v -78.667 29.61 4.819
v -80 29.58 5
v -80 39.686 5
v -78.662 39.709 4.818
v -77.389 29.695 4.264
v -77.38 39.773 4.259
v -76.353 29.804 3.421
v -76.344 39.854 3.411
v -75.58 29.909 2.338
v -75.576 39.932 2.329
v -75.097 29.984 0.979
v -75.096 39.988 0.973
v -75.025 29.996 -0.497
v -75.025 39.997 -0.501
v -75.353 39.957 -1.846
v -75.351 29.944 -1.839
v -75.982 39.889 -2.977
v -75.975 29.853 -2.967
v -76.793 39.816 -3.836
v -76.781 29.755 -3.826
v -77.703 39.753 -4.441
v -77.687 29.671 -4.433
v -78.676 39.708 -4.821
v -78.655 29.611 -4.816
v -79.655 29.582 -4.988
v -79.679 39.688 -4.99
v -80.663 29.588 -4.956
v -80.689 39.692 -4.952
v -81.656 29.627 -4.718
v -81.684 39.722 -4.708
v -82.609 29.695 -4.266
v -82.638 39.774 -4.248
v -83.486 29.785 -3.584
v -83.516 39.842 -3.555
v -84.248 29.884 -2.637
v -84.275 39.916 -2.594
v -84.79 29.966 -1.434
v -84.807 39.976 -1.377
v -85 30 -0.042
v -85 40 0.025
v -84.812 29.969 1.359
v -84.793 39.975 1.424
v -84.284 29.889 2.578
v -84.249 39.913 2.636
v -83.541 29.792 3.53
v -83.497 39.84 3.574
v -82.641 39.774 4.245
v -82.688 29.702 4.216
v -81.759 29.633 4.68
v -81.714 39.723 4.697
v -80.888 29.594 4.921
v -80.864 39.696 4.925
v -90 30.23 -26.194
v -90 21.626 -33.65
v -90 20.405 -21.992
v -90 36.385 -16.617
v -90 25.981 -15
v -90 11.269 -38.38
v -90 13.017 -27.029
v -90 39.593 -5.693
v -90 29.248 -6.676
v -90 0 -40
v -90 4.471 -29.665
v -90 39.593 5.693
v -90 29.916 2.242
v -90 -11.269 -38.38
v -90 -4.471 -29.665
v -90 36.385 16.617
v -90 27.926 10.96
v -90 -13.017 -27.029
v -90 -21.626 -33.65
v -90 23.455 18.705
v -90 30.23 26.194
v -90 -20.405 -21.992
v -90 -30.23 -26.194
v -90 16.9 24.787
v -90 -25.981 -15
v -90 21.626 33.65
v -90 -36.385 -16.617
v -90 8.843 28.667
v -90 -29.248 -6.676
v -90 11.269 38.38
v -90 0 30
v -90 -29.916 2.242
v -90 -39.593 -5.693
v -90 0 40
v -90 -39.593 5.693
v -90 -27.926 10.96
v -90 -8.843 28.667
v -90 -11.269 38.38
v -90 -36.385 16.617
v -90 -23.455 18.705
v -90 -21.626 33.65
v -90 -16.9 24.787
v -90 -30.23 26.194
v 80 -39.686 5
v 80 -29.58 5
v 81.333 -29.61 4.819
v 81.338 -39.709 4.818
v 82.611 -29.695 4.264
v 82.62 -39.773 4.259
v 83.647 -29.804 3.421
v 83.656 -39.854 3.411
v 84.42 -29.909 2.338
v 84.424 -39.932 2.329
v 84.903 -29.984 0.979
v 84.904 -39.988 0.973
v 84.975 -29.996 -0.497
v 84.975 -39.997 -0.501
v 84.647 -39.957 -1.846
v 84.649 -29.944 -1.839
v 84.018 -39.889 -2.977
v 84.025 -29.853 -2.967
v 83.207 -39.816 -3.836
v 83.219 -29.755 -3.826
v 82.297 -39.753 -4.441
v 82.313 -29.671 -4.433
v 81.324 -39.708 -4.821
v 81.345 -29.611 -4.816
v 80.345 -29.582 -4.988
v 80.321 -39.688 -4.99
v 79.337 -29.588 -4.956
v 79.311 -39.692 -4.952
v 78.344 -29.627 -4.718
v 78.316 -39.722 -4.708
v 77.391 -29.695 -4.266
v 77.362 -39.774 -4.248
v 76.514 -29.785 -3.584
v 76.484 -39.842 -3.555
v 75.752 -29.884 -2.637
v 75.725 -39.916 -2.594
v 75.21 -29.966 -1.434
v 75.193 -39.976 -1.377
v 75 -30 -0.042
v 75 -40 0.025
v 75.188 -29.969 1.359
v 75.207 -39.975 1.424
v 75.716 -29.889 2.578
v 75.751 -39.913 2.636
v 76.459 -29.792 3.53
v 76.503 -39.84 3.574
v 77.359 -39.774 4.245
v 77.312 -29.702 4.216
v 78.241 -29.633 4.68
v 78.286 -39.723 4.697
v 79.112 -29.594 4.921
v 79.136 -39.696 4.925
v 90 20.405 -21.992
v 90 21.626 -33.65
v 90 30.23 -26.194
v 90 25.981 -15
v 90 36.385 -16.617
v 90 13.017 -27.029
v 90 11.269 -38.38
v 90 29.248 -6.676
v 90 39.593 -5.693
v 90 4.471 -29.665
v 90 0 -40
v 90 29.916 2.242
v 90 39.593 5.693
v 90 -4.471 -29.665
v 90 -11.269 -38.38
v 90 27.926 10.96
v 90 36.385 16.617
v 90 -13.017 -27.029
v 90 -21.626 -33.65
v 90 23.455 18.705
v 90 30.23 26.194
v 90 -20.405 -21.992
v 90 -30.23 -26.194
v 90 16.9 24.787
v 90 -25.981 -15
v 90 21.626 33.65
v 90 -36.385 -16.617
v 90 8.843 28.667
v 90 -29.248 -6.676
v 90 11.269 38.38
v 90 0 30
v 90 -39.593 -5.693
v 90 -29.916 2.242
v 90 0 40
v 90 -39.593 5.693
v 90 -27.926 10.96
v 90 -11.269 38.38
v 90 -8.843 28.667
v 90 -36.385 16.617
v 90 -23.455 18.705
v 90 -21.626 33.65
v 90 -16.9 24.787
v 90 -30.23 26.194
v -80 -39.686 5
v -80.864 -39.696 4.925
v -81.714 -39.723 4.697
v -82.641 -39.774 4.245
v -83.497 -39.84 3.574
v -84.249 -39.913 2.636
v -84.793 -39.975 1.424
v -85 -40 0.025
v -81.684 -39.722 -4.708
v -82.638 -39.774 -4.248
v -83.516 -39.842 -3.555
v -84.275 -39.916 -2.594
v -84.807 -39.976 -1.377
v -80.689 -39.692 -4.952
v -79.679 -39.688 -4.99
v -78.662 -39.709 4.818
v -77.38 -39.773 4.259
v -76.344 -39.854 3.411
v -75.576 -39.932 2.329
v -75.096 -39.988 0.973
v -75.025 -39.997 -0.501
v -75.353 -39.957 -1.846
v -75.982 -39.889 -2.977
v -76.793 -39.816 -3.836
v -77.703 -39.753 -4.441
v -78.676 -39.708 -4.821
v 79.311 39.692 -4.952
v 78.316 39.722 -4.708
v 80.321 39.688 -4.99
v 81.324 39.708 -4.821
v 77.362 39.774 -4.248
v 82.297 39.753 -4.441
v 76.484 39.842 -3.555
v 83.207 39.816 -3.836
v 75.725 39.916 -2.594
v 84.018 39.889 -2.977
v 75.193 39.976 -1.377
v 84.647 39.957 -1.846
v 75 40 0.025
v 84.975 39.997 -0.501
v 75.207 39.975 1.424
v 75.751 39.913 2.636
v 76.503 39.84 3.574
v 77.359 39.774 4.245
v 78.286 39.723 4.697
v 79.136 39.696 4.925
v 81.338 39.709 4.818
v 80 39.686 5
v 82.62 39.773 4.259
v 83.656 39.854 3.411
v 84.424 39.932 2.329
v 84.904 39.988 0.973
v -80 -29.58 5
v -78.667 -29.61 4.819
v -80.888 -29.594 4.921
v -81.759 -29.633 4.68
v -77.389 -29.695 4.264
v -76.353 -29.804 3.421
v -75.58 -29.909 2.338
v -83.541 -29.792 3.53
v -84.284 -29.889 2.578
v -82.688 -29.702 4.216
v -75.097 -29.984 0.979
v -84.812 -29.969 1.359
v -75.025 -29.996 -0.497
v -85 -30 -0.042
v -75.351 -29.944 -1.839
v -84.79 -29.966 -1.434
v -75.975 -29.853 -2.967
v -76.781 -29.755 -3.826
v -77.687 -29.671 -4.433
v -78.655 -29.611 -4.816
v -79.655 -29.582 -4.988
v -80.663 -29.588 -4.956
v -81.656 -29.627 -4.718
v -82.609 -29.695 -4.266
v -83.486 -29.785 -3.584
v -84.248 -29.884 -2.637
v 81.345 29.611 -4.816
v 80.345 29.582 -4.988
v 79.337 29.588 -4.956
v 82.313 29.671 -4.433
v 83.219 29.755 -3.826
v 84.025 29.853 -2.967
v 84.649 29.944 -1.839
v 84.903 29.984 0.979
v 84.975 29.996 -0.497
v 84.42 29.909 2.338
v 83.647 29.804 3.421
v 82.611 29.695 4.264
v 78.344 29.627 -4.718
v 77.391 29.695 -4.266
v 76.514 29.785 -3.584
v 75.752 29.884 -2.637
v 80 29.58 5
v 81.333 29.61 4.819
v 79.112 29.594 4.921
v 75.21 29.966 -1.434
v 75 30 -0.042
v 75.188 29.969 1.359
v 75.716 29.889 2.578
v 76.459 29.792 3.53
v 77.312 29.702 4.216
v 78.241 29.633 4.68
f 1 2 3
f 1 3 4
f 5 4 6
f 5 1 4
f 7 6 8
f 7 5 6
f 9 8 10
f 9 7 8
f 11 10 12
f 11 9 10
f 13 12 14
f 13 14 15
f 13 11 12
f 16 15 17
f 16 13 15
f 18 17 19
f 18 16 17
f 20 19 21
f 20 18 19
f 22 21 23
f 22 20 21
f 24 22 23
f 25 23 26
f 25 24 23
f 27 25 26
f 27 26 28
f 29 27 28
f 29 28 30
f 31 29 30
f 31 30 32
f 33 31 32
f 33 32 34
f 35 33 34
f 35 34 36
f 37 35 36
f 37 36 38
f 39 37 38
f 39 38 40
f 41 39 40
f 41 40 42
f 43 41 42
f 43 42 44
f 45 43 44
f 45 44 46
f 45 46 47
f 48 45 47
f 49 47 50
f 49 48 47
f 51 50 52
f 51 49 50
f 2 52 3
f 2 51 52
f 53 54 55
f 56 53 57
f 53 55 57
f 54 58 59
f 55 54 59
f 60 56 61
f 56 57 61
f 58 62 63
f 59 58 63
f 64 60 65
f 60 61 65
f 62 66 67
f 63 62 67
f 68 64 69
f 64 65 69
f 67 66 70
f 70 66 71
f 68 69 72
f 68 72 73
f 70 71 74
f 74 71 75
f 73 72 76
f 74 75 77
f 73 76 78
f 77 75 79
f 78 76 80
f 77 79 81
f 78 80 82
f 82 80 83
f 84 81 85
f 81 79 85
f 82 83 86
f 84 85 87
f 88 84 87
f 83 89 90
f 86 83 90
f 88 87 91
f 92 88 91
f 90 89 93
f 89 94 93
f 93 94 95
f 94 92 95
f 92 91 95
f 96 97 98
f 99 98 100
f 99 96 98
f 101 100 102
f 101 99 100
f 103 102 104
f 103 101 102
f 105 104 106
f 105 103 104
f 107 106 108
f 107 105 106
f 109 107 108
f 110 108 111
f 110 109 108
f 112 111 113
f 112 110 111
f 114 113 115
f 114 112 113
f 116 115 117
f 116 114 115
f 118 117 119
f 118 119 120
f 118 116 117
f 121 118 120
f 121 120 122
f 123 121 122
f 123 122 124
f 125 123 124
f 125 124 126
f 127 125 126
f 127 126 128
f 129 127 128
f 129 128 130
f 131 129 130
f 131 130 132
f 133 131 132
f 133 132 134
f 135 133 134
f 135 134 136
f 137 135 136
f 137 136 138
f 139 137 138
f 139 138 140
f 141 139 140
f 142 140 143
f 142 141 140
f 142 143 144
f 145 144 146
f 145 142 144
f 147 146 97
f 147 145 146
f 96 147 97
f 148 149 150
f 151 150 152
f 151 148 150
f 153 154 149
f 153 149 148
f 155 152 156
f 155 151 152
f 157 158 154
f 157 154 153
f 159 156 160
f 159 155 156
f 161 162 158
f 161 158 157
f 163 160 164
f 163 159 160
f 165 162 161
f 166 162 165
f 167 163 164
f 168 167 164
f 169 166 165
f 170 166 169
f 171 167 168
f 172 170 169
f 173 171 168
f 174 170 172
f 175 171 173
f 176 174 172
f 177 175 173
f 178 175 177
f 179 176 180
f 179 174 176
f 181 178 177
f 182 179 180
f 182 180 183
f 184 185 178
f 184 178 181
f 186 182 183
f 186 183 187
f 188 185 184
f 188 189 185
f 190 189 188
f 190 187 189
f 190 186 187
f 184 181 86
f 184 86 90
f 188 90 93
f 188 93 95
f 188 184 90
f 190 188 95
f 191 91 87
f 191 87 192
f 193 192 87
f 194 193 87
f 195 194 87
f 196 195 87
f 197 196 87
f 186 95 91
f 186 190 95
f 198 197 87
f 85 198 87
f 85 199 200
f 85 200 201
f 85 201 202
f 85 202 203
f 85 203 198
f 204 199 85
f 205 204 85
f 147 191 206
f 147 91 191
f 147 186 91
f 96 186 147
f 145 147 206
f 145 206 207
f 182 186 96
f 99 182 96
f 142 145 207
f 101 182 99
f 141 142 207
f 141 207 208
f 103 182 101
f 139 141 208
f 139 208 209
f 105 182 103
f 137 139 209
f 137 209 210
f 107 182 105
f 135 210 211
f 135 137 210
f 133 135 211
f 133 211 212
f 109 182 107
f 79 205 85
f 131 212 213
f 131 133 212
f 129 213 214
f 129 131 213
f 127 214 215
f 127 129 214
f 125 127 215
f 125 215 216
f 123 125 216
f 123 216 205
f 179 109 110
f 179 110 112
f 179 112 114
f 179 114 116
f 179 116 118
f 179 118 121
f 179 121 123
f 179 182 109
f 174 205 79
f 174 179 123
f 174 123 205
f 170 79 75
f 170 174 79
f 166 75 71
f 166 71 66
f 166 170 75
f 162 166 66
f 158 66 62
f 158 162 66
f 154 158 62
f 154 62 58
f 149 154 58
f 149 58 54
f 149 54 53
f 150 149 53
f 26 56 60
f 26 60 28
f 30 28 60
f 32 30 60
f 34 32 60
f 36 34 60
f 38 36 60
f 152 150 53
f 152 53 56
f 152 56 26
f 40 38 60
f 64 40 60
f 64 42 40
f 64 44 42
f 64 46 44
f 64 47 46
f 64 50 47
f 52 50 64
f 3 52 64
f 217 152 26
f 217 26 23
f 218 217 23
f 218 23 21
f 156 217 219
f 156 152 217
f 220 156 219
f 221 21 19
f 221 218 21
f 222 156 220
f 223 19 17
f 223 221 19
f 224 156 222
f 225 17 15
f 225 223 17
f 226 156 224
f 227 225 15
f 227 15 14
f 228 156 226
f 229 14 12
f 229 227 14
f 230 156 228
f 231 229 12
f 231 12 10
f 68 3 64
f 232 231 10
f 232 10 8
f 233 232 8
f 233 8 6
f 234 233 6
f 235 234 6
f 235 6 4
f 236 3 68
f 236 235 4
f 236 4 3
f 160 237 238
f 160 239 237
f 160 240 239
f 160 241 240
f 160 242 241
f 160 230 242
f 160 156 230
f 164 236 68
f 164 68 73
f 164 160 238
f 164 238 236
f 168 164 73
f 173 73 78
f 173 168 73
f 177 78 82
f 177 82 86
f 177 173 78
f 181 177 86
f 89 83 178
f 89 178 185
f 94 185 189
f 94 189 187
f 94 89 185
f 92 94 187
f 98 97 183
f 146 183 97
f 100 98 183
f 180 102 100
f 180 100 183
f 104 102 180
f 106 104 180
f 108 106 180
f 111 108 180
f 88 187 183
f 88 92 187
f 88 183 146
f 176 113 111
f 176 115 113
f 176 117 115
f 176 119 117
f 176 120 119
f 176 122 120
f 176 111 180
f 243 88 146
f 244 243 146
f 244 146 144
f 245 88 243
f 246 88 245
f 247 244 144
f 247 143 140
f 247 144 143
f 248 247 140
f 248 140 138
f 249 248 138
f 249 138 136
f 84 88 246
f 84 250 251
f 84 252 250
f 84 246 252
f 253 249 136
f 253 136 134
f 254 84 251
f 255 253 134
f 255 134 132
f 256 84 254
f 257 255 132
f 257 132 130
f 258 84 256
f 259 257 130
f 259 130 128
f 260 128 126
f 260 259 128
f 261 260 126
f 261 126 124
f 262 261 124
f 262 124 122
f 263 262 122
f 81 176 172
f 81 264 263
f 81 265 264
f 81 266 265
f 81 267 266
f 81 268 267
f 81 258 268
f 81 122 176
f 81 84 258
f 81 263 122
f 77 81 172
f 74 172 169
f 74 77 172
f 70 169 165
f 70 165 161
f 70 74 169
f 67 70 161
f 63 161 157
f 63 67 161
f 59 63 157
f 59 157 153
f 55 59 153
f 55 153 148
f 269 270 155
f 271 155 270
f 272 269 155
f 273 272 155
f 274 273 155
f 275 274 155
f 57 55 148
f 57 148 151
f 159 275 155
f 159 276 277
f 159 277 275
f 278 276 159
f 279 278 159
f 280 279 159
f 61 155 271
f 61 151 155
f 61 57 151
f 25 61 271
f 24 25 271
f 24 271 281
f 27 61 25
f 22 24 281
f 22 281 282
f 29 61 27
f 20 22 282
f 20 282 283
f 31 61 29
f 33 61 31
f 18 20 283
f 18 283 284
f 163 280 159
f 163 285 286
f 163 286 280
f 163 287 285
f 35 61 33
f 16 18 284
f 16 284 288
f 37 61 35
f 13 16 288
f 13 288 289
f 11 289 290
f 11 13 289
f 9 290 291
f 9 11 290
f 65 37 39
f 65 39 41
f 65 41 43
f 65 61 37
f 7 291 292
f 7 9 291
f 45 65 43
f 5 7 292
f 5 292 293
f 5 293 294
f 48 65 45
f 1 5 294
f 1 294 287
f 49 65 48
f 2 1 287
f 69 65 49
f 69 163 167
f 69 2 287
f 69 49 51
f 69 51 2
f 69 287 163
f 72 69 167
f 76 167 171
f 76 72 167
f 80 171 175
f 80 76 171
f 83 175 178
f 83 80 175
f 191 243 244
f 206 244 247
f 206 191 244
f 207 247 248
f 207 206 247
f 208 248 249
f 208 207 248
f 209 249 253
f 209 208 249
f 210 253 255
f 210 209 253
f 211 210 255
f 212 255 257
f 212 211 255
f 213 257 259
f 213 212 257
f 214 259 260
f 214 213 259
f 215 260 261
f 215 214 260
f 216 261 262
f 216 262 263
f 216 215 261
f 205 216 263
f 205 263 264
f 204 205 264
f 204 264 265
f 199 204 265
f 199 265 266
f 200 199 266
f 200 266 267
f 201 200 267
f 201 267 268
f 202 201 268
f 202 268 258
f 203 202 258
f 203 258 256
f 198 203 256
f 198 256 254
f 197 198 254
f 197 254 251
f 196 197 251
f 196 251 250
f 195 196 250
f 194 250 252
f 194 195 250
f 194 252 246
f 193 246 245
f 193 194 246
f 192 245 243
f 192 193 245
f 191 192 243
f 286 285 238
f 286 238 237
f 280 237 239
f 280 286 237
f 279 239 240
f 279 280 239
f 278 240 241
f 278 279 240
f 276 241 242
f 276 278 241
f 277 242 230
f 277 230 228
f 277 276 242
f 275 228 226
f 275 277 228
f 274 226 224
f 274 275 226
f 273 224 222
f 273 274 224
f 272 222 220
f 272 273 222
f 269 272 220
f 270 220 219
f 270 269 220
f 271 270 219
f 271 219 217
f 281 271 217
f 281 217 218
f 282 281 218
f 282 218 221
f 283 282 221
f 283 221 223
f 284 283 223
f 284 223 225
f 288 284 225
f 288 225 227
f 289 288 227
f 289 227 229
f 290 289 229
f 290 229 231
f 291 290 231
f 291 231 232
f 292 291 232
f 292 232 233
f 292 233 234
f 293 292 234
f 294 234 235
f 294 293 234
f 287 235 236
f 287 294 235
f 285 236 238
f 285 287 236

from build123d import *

# Parameters (mm, degrees)
CROQUIS1_R                 = 40
CROQUIS1_R_2               = 30
SALIENTE_EXTRUIR1_DEPTH    = 90
CORTAR_EXTRUIR1_DEPTH      = 107.301458127
CORTAR_EXTRUIR1_DEPTH_BACK = 107.301458127
CROQUIS2_R                 = 5


with BuildPart() as part:
    # Croquis1 → Saliente-Extruir1 (new, symmetric)
    with BuildSketch(Plane(origin=(0, 0, 0), x_dir=(0, 0, -1), z_dir=(1, 0, 0))):
        with Locations(Location((0, 0, 0), (0, 0, 180))):
            Circle(CROQUIS1_R)
        with Locations(Location((0, 0, 0), (0, 0, 180))):
            Circle(CROQUIS1_R_2, mode=Mode.SUBTRACT)
    extrude(amount=SALIENTE_EXTRUIR1_DEPTH, both=True)

    # Croquis2 → Cortar-Extruir1 (cut, two sides: drawn at the far end of the back side and taken through both)
    with BuildSketch(Plane(origin=(0, 0, 0), x_dir=(1, 0, 0), z_dir=(0, 1, 0)).offset(-CORTAR_EXTRUIR1_DEPTH_BACK)):
        with Locations(Location((-80, 0, 0), (0, 0, 270))):
            Circle(CROQUIS2_R)
        with Locations(Location((80, 0, 0), (0, 0, 270))):
            Circle(CROQUIS2_R)
    extrude(amount=CORTAR_EXTRUIR1_DEPTH + CORTAR_EXTRUIR1_DEPTH_BACK, mode=Mode.SUBTRACT)


solid = part.part
